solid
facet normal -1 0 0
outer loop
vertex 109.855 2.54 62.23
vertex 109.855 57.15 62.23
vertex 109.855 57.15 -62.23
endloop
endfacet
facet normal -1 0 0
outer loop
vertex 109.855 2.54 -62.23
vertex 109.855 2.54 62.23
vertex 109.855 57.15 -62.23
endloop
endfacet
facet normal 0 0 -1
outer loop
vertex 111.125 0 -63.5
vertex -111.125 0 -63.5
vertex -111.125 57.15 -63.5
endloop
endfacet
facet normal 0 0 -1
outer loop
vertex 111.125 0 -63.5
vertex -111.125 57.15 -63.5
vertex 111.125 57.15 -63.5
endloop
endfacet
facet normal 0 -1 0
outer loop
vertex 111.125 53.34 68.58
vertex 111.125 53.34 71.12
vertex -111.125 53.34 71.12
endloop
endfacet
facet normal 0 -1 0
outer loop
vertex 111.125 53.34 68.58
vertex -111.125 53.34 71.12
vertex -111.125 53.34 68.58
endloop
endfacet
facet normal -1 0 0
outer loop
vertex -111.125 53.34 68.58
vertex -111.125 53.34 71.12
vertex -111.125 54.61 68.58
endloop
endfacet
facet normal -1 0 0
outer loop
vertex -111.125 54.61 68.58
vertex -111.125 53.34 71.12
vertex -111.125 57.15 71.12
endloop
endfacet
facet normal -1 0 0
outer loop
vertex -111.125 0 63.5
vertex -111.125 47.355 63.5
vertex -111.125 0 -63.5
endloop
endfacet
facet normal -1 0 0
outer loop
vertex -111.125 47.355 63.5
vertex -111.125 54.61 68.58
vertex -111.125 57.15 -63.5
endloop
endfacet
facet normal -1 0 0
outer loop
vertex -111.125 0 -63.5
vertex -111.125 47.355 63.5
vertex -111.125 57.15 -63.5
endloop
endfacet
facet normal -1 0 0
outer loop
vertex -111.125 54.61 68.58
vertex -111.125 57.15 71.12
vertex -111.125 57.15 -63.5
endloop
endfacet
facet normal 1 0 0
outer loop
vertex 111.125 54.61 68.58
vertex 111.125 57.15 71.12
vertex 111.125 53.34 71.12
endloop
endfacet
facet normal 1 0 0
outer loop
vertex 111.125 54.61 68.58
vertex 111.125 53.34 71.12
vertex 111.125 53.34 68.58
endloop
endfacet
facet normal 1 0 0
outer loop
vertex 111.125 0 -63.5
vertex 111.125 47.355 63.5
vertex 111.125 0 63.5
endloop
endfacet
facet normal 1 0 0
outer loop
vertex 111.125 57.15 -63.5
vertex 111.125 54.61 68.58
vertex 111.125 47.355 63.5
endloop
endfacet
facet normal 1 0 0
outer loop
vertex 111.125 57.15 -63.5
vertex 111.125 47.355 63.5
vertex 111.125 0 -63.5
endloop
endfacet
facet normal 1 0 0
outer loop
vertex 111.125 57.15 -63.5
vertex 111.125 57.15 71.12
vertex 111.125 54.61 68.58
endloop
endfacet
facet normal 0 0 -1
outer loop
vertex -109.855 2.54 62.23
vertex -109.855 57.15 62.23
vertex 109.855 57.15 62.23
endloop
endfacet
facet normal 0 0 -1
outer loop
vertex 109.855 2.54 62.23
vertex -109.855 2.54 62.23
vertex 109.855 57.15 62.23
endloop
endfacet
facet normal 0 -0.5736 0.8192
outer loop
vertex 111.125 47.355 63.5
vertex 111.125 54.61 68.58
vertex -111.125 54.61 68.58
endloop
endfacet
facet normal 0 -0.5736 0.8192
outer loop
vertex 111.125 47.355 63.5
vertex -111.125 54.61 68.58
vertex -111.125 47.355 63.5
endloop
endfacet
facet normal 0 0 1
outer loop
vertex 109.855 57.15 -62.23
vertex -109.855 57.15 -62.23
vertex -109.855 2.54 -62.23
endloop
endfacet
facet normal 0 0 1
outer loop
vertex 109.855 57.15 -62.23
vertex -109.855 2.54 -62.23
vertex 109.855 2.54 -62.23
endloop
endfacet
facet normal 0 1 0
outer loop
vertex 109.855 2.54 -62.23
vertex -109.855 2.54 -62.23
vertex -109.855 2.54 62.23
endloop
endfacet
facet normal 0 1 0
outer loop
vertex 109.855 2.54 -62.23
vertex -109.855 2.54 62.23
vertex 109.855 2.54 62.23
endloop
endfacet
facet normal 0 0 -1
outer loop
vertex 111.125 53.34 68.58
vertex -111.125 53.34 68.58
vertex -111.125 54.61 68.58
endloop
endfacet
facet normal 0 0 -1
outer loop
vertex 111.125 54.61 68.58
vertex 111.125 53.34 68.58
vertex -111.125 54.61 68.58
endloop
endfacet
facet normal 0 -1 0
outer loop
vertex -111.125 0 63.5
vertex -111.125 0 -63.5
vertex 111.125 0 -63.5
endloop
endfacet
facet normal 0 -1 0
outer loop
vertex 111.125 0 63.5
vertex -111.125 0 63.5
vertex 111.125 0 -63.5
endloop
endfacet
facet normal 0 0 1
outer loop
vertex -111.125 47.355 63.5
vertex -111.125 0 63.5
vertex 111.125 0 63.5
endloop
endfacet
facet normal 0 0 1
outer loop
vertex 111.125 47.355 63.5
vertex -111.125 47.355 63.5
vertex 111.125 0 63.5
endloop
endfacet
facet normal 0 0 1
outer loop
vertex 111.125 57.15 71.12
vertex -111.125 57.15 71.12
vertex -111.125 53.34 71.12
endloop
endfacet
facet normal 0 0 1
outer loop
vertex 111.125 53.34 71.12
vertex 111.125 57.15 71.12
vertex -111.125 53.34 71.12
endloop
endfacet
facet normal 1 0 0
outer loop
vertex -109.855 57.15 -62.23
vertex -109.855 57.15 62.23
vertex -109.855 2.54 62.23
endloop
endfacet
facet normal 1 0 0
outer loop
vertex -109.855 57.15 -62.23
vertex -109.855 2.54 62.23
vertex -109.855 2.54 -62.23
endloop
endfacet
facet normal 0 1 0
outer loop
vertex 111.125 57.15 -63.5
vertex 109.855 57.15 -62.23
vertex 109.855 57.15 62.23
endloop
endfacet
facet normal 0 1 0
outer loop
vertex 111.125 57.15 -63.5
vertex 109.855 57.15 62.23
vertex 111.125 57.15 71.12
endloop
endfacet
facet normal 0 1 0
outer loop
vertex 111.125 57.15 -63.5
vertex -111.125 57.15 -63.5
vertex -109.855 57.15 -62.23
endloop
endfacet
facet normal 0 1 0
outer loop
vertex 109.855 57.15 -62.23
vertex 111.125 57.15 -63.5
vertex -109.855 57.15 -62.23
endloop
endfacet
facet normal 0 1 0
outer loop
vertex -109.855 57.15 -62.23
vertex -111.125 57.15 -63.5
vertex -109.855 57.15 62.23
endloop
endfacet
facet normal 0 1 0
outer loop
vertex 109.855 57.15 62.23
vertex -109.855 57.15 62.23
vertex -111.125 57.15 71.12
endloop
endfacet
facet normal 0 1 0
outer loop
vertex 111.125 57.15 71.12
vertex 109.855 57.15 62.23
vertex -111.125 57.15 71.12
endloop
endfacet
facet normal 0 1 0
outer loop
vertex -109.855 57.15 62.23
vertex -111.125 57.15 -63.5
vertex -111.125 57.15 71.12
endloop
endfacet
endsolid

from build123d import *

# Parameters (mm, degrees)
SKETCH3_W          = 222.25
SKETCH3_H          = 127
LOWER_DRAWER_DEPTH = 57.15
SKETCH6_W          = 219.71
SKETCH6_H          = 124.46
CUT_EXTRUDE1_DEPTH = 54.61
HANDLE_DEPTH       = 222.25


with BuildPart() as part:
    # Sketch3 → lower drawer (new body)
    with BuildSketch(Plane(origin=(0, 0, 0), x_dir=(1, 0, 0), z_dir=(0, 1, 0))):
        Rectangle(SKETCH3_W, SKETCH3_H)
    extrude(amount=LOWER_DRAWER_DEPTH)

    # Sketch6 → Cut-Extrude1 (cut)
    with BuildSketch(Plane(origin=(0, 57.15, 0), x_dir=(1, 0, 0), z_dir=(0, 1, 0))):
        Rectangle(SKETCH6_W, SKETCH6_H)
    extrude(amount=-CUT_EXTRUDE1_DEPTH, mode=Mode.SUBTRACT)

    # Sketch10 → handle (add)
    with BuildSketch(Plane.ZY.offset(111.125)):
        Polygon((63.5, 57.15), (71.12, 57.15), (71.12, 53.34), (68.58, 53.34), (68.58, 54.61), (63.5, 47.355008126), align=None)
    extrude(amount=-HANDLE_DEPTH)


solid = part.part
